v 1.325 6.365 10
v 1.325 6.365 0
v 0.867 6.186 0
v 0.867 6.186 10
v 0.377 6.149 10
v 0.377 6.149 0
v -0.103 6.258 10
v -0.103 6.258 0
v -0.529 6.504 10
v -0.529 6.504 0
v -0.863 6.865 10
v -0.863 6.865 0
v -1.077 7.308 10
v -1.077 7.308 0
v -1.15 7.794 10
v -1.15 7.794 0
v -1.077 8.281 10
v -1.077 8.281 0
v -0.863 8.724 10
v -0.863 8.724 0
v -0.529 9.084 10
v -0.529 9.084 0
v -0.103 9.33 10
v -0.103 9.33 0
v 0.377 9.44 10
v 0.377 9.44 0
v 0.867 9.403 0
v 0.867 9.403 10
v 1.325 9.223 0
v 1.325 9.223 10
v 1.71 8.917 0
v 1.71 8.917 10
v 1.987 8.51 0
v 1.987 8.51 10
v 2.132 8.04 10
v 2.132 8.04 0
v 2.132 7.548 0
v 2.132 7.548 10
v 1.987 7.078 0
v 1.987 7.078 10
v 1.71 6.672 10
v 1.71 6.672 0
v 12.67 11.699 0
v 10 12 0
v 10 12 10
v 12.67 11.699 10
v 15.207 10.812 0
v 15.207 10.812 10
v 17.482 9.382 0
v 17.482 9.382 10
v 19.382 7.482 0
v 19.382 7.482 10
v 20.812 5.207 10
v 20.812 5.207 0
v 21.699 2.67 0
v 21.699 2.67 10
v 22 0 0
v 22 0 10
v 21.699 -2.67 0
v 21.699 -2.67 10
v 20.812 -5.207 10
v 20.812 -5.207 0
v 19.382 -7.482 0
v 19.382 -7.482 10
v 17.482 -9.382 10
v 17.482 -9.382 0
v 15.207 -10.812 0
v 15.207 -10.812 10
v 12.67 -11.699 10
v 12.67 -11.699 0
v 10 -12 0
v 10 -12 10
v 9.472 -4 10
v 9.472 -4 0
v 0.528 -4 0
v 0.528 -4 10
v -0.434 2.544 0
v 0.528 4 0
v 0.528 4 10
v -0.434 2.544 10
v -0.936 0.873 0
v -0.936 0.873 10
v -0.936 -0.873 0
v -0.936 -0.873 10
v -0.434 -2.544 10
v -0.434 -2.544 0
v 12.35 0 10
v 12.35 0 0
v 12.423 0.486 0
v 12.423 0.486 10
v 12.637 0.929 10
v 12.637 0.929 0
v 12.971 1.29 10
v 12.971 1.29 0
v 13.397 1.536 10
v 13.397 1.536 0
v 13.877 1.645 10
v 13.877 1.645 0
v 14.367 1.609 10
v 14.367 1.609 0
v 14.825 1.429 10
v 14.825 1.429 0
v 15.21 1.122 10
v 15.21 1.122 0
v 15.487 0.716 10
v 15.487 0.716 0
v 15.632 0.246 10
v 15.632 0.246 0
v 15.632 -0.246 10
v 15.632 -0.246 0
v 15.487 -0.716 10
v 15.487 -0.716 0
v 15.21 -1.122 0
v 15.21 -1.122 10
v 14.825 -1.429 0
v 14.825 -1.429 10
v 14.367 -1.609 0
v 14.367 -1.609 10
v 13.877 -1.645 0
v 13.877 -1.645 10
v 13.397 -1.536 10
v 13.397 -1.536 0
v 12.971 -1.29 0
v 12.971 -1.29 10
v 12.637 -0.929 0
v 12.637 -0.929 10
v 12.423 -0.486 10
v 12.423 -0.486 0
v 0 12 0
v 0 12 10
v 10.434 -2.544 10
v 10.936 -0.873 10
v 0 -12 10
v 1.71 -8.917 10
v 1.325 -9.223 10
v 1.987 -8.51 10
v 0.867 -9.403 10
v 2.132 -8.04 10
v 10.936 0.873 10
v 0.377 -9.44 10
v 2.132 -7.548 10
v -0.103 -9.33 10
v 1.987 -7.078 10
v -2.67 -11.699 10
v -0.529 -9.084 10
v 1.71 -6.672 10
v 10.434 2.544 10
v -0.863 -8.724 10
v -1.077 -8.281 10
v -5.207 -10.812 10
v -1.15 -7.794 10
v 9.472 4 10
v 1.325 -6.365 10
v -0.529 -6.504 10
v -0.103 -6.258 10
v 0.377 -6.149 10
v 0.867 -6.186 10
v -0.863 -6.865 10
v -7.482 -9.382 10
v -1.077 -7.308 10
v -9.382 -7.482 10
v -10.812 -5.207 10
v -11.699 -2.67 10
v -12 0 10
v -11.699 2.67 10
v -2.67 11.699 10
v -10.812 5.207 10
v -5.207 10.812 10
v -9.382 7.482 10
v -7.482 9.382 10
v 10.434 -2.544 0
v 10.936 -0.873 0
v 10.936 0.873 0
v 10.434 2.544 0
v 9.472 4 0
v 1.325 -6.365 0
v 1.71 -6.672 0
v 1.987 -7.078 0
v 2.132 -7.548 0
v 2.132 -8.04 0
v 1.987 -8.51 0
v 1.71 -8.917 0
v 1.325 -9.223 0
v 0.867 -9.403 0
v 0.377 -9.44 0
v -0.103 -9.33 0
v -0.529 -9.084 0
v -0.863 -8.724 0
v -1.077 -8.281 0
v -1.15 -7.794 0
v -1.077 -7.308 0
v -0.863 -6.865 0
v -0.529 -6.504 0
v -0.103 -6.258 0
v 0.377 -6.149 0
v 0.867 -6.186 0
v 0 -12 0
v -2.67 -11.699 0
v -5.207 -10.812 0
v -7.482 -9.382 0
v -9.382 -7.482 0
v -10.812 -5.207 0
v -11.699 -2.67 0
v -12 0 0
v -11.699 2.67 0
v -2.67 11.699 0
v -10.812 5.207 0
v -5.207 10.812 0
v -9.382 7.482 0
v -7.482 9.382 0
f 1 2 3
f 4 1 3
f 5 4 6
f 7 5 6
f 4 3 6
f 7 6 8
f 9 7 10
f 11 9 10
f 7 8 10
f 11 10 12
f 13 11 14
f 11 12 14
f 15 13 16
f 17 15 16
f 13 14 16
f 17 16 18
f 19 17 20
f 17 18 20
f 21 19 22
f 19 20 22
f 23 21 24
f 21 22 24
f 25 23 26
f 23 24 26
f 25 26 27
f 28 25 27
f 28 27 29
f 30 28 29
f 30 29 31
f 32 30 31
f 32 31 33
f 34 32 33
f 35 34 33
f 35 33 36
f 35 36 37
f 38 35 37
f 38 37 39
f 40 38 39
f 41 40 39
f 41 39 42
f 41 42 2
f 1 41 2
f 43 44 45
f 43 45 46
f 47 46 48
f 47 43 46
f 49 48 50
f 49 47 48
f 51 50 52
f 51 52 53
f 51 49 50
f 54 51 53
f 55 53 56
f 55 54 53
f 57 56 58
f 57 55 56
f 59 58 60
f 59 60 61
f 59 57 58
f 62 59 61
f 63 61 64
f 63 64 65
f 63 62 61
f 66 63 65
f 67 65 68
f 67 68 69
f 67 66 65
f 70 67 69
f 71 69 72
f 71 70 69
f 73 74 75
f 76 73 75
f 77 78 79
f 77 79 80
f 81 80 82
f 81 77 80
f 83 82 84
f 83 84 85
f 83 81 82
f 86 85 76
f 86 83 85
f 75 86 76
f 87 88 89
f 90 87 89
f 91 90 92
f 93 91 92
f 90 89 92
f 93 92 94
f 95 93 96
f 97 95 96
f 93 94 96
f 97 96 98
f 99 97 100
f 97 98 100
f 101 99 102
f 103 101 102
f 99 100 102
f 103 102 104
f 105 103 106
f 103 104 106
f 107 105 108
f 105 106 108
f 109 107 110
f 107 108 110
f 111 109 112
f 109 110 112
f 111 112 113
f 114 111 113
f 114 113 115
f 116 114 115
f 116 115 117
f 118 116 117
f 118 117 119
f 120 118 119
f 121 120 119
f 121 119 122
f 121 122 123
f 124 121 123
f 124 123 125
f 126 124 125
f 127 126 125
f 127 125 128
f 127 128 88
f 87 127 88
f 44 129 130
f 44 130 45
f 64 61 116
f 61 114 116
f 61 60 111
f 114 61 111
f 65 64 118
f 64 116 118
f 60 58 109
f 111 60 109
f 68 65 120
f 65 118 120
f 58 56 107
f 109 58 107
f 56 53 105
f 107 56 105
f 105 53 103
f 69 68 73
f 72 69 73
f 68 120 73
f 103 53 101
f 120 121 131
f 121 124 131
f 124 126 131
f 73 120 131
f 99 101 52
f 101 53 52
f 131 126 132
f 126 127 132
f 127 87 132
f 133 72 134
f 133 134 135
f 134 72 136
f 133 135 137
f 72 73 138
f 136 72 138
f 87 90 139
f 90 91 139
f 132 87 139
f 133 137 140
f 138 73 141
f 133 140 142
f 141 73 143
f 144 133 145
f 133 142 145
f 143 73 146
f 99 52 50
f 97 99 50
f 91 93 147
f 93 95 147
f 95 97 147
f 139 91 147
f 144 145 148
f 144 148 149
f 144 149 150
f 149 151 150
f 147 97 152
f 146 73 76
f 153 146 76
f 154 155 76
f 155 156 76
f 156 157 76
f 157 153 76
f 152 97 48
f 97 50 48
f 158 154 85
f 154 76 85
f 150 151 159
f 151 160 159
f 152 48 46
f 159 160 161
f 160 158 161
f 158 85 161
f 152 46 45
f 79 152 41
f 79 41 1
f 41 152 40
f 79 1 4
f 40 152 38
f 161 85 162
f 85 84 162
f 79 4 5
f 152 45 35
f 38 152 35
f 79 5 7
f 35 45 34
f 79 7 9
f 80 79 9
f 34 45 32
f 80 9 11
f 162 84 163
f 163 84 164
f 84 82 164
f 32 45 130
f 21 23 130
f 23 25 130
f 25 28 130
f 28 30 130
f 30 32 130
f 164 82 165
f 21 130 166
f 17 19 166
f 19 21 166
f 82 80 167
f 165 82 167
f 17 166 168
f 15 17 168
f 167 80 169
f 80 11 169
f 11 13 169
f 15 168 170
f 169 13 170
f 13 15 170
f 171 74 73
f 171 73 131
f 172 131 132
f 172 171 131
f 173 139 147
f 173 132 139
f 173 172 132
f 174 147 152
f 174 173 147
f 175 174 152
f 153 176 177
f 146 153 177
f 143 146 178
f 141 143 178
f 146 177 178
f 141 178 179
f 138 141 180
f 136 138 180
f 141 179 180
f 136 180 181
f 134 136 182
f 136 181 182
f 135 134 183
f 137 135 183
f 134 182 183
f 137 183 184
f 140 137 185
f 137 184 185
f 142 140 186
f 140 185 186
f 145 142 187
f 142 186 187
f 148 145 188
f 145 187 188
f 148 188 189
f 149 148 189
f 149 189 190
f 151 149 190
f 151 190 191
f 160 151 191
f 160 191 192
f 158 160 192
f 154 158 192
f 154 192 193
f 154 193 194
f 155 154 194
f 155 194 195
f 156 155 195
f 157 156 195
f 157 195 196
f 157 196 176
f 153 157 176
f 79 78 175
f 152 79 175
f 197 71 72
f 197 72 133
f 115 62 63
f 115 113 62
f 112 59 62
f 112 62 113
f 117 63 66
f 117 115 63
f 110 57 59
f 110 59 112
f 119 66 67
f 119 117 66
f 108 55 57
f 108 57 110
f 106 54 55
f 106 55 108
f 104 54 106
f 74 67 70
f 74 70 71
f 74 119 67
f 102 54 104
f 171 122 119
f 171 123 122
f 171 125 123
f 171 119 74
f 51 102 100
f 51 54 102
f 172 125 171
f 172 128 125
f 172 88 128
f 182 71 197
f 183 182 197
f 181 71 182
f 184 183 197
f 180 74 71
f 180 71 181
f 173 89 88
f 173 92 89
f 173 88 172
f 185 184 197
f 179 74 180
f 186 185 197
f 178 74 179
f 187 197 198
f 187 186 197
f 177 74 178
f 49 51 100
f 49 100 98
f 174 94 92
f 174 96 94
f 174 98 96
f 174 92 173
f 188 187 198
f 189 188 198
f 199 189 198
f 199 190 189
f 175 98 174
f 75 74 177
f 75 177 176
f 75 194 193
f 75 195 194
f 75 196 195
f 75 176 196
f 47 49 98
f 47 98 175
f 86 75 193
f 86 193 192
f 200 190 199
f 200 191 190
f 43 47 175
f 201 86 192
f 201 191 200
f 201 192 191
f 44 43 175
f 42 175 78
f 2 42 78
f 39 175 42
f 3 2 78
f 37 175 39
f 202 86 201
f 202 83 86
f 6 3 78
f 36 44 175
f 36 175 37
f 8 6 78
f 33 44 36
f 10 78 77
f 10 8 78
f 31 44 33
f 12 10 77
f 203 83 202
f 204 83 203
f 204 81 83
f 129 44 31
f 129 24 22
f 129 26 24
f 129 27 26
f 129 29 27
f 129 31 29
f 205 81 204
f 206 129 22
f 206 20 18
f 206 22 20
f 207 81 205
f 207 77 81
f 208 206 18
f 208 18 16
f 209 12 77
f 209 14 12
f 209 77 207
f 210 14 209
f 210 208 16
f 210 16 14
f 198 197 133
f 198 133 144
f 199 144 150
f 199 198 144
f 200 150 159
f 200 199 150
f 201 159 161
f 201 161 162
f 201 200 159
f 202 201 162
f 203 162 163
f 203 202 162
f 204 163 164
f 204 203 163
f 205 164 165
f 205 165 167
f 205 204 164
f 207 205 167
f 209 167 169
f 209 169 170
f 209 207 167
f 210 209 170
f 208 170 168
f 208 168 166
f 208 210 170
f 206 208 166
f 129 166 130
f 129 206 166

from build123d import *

# Parameters (mm, degrees)
SKETCH1_R           = 6
BOSS_EXTRUDE1_DEPTH = 10
M4_TAPPED_HOLE1_D   = 3.3
CIRPATTERN1_COUNT   = 3
BOSS_EXTRUDE2_START = -10
BOSS_EXTRUDE2_DEPTH = 10


with BuildPart() as part:
    # Sketch1 → Boss-Extrude1 (new body)
    with BuildSketch(Plane.XY):
        with BuildLine():
            Line((0, 12), (10, 12))
            ThreePointArc((10, 12), (22, 0), (10, -12))
            Line((10, -12), (0, -12))
            ThreePointArc((0, -12), (-12, 0), (0, 12))
        make_face()
        with Locations((5, 0)):
            Circle(SKETCH1_R, mode=Mode.SUBTRACT)
    extrude(amount=BOSS_EXTRUDE1_DEPTH)

    # M4 Tapped Hole1 (through all)
    with Locations(Plane(origin=(14, 0, 10), x_dir=(1, 0, 0), z_dir=(0, 0, 1))):
        with Locations((0, 0)):
            m4_tapped_hole1 = Hole(M4_TAPPED_HOLE1_D / 2)

    # CirPattern1: M4 Tapped Hole1 ×3 about axis
    cirpattern1_axis = Axis((5, 0, 0), (0, 0, 1))
    for i in range(1, CIRPATTERN1_COUNT):
        add(m4_tapped_hole1.rotate(cirpattern1_axis, i * 360 / CIRPATTERN1_COUNT), mode=Mode.SUBTRACT)

    # Sketch4 → Boss-Extrude2 (add)
    with BuildSketch(Plane.XY.offset(10).offset(BOSS_EXTRUDE2_START)):
        with BuildLine():
            ThreePointArc((9.472135955, 4), (5, 6), (0.527864045, 4))
            Line((0.527864045, 4), (9.472135955, 4))
        make_face()
        with BuildLine():
            Line((9.472135955, -4), (0.527864045, -4))
            ThreePointArc((0.527864045, -4), (5, -6), (9.472135955, -4))
        make_face()
    extrude(amount=BOSS_EXTRUDE2_DEPTH)


solid = part.part
